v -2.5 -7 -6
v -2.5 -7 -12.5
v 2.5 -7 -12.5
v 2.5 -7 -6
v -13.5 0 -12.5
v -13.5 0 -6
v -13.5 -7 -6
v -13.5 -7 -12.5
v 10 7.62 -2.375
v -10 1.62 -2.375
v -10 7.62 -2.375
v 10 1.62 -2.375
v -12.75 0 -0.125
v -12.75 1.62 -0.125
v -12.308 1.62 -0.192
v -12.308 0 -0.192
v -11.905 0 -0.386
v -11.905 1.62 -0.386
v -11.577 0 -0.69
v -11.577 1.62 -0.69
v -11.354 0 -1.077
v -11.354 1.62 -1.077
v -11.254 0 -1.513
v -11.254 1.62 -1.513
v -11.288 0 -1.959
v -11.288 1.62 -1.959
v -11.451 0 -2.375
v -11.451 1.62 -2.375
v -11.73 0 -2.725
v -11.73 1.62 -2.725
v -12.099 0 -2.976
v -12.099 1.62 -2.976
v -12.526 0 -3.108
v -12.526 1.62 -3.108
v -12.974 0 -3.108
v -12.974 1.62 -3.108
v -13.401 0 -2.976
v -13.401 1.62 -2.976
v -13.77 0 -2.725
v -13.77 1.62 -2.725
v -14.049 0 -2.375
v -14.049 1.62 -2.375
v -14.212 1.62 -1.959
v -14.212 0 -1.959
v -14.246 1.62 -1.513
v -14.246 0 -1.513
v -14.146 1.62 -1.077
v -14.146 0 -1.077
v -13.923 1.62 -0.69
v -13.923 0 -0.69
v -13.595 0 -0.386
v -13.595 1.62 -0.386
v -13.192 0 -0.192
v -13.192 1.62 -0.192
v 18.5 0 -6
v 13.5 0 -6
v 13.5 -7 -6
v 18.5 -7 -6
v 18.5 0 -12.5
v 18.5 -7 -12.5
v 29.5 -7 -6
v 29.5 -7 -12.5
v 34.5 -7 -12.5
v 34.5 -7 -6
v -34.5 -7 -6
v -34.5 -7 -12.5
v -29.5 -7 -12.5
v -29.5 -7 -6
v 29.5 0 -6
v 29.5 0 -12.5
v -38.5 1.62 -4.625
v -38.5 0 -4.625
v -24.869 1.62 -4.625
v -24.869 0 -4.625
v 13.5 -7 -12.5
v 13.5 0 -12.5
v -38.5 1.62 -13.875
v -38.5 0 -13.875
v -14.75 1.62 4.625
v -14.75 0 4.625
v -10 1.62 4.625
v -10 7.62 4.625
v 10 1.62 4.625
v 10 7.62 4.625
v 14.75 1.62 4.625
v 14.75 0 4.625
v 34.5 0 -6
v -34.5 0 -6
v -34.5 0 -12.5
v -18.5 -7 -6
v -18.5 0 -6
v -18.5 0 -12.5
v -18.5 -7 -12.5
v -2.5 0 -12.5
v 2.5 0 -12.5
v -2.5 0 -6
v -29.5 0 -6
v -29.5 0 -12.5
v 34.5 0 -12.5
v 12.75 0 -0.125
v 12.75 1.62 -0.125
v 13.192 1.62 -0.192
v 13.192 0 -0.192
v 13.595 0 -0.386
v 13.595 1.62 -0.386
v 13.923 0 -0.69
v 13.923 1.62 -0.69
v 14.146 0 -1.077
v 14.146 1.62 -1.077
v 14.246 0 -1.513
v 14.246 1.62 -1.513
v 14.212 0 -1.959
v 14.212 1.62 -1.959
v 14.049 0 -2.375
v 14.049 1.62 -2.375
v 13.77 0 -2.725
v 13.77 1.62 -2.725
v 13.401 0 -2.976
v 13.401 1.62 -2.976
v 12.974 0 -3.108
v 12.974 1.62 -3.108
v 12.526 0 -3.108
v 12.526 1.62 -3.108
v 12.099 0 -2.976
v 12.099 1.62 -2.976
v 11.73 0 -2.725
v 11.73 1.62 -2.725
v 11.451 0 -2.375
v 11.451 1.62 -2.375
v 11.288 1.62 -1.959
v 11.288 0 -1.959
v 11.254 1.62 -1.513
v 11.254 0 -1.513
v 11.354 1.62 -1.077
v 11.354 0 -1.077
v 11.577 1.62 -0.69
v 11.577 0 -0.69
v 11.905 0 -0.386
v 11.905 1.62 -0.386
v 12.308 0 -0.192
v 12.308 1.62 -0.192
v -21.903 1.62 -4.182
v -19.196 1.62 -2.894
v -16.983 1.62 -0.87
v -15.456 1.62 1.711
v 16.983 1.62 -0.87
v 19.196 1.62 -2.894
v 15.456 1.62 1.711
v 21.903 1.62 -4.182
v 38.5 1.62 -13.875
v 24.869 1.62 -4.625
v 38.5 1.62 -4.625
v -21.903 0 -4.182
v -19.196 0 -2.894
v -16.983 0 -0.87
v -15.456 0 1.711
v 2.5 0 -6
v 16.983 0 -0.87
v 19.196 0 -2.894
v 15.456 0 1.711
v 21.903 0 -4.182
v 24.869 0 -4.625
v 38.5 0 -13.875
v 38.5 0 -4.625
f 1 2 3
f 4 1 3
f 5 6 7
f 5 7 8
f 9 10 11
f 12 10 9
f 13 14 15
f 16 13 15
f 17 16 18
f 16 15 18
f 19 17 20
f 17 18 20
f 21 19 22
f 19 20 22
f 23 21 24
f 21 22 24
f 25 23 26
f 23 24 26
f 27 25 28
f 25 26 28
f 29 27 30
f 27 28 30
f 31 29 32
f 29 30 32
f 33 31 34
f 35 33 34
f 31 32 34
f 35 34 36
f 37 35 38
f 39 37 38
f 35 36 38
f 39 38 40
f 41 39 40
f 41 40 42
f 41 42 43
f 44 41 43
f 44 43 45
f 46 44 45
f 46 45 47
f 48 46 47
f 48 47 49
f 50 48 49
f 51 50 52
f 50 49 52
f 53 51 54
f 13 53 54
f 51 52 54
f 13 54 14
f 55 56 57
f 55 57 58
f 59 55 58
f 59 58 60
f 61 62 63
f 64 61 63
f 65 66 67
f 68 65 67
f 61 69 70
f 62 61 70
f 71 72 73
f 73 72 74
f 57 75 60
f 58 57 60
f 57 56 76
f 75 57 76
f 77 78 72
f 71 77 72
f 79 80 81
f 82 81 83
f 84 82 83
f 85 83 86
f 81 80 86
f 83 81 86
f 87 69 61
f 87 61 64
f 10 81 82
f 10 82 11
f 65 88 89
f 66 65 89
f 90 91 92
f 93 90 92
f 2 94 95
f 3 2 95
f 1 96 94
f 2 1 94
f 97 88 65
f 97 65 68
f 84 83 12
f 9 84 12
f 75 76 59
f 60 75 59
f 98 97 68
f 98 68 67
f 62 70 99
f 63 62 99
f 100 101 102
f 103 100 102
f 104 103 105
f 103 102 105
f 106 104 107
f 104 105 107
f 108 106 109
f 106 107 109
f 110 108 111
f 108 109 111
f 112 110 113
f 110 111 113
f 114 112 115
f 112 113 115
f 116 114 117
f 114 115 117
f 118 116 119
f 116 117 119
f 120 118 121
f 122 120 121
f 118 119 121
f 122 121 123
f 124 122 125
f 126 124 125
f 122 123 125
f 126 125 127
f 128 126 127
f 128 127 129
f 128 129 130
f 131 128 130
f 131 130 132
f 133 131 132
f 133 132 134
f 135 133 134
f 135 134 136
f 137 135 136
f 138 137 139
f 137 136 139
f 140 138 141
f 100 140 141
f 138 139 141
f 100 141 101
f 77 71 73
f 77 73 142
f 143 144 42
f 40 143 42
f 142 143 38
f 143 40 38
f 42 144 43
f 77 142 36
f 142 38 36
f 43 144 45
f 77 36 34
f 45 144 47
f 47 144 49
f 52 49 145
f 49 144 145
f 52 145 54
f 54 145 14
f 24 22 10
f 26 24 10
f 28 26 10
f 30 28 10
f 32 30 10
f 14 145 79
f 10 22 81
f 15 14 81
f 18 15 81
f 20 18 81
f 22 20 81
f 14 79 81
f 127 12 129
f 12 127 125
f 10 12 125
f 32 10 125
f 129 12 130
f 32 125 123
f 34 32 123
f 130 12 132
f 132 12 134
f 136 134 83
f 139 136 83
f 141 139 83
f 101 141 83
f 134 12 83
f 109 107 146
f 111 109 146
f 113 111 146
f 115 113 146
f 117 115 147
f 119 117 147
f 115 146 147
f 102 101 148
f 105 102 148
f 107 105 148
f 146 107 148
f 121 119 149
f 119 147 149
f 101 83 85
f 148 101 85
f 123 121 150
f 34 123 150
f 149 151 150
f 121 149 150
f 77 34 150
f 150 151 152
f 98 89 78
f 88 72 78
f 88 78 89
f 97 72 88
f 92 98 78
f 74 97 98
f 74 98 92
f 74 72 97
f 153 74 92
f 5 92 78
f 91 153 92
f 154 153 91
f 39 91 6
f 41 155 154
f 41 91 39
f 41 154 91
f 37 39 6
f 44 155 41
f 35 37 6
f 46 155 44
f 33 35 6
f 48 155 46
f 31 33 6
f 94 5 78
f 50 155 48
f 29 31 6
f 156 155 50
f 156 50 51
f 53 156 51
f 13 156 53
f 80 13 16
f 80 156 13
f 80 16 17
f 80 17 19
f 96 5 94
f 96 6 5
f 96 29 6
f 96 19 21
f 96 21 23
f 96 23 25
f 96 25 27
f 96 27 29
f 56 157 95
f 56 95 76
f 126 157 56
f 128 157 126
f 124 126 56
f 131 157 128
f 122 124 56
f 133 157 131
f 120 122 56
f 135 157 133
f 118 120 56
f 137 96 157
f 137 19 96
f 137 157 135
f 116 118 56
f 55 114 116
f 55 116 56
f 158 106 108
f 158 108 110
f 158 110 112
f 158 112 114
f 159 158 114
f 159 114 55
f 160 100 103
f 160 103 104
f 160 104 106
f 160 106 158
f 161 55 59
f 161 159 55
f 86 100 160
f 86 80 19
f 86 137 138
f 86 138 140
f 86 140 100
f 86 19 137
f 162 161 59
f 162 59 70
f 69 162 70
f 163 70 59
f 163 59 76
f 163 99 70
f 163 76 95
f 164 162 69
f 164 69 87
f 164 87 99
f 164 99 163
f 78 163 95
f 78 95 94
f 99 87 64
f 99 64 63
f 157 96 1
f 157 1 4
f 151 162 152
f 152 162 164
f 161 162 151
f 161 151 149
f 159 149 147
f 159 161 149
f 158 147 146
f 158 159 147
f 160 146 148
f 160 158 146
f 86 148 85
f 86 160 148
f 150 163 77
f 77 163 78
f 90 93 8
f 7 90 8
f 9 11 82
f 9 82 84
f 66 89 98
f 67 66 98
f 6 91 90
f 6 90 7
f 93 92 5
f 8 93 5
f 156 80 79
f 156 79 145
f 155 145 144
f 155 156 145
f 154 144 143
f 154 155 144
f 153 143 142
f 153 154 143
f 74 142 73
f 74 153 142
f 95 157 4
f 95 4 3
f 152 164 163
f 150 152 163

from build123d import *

# Parameters (mm, degrees)
SKETCH1_W           = 5
SKETCH1_H           = 6.5
SKETCH1_W_2         = 29.5
SKETCH1_H_2         = 9.25
BOSS_EXTRUDE1_DEPTH = 1.62
FILLET1_R           = 10.16
SKETCH1_3_W         = 5
SKETCH1_3_H         = 6.5
BOSS_EXTRUDE2_DEPTH = 7
SKETCH2_R           = 1.5
CUT_EXTRUDE1_DEPTH  = 1.62
SKETCH3_W           = 20
SKETCH3_H           = 7
BOSS_EXTRUDE3_DEPTH = 6


with BuildPart() as part:
    # Sketch1 → Boss-Extrude1 (new body)
    # profile 1 of 7: a face of its own
    with BuildSketch(Plane(origin=(0, 0, 0), x_dir=(1, 0, 0), z_dir=(0, 1, 0))):
        Polygon((-38.5, 4.625), (-14.75, 4.625), (14.75, 4.625), (38.5, 4.625), (38.5, 13.875), (-38.5, 13.875), align=None)
        with Locations((-31.9999868, 9.25)):
            Rectangle(SKETCH1_W, SKETCH1_H, mode=Mode.SUBTRACT)
        with Locations((-15.9999934, 9.25)):
            Rectangle(SKETCH1_W, SKETCH1_H, mode=Mode.SUBTRACT)
        with Locations((0, 9.25)):
            Rectangle(SKETCH1_W, SKETCH1_H, mode=Mode.SUBTRACT)
        with Locations((15.9999934, 9.25)):
            Rectangle(SKETCH1_W, SKETCH1_H, mode=Mode.SUBTRACT)
        with Locations((31.9999868, 9.25)):
            Rectangle(SKETCH1_W, SKETCH1_H, mode=Mode.SUBTRACT)
    # profile 2 of 7: a face of its own
    with BuildSketch(Plane(origin=(0, 0, 0), x_dir=(1, 0, 0), z_dir=(0, 1, 0))):
        with Locations((-31.9999868, 9.25)):
            Rectangle(SKETCH1_W, SKETCH1_H)
    # profile 3 of 7: a face of its own
    with BuildSketch(Plane(origin=(0, 0, 0), x_dir=(1, 0, 0), z_dir=(0, 1, 0))):
        with Locations((-15.9999934, 9.25)):
            Rectangle(SKETCH1_W, SKETCH1_H)
    # profile 4 of 7: a face of its own
    with BuildSketch(Plane(origin=(0, 0, 0), x_dir=(1, 0, 0), z_dir=(0, 1, 0))):
        Rectangle(SKETCH1_W_2, SKETCH1_H_2)
    # profile 5 of 7: a face of its own
    with BuildSketch(Plane(origin=(0, 0, 0), x_dir=(1, 0, 0), z_dir=(0, 1, 0))):
        with Locations((0, 9.25)):
            Rectangle(SKETCH1_W, SKETCH1_H)
    # profile 6 of 7: a face of its own
    with BuildSketch(Plane(origin=(0, 0, 0), x_dir=(1, 0, 0), z_dir=(0, 1, 0))):
        with Locations((15.9999934, 9.25)):
            Rectangle(SKETCH1_W, SKETCH1_H)
    # profile 7 of 7: a face of its own
    with BuildSketch(Plane(origin=(0, 0, 0), x_dir=(1, 0, 0), z_dir=(0, 1, 0))):
        with Locations((31.9999868, 9.25)):
            Rectangle(SKETCH1_W, SKETCH1_H)
    extrude(amount=BOSS_EXTRUDE1_DEPTH)

    # Fillet1
    # the kernel refuses this fillet: 10.16 mm, written as the material it adds along each edge
    with BuildSketch(Plane(origin=(14.75, 0, -4.625), x_dir=(0, 0, 1), z_dir=(0, 1, 0))) as fillet1_piece_1:
        with BuildLine():
            CenterArc((10.16, 10.119164985), FILLET1_R, 180, 84.861306661)
            Line((0, 10.119164985), (-0.2032, 10.119164985))
            Line((-0.2032, 10.119164985), (-0.2032, 0))
            Line((-0.2032, 0), (0, -0.2032))
            ThreePointArc((0, -0.2032), (4.625, -0.2032), (9.2318, -0.2023833))
            Line((9.2318, -0.2023833), (9.25, 0))
        make_face()
    extrude(amount=1.62)
    with BuildSketch(Plane(origin=(-14.75, 0, -4.625), x_dir=(-1, 0, 0), z_dir=(0, 1, 0))) as fillet1_piece_2:
        with BuildLine():
            CenterArc((10.119164985, 10.16), FILLET1_R, 185.138693339, 84.861306661)
            Line((0, 9.25), (-0.2023833, 9.2318))
            ThreePointArc((-0.2023833, 9.2318), (-0.2032, 4.625), (-0.2032, 0))
            Line((-0.2032, 0), (0, -0.2032))
            Line((0, -0.2032), (10.119164985, -0.2032))
            Line((10.119164985, -0.2032), (10.119164985, 0))
        make_face()
    extrude(amount=1.62)

    # Sketch1<3> → Boss-Extrude2 (add)
    with BuildSketch(Plane(origin=(0, 0, 0), x_dir=(1, 0, 0), z_dir=(0, 1, 0))):
        with Locations((31.9999868, 9.25)):
            Rectangle(SKETCH1_3_W, SKETCH1_3_H)
        with Locations((15.9999934, 9.25)):
            Rectangle(SKETCH1_3_W, SKETCH1_3_H)
        with Locations((0, 9.25)):
            Rectangle(SKETCH1_3_W, SKETCH1_3_H)
        with Locations((-15.9999934, 9.25)):
            Rectangle(SKETCH1_3_W, SKETCH1_3_H)
        with Locations((-31.9999868, 9.25)):
            Rectangle(SKETCH1_3_W, SKETCH1_3_H)
    extrude(amount=-BOSS_EXTRUDE2_DEPTH)

    # Sketch2 → Cut-Extrude1 (cut)
    with BuildSketch(Plane(origin=(0, 1.62, 0), x_dir=(1, 0, 0), z_dir=(0, 1, 0))):
        with Locations(Location((-12.749999979, 1.624999898, 0), (0, 0, 270))):
            Circle(SKETCH2_R)
        with Locations(Location((12.749999979, 1.624999898, 0), (0, 0, 270))):
            Circle(SKETCH2_R)
    extrude(amount=-CUT_EXTRUDE1_DEPTH, mode=Mode.SUBTRACT)

    # Sketch3 → Boss-Extrude3 (add)
    with BuildSketch(Plane(origin=(0, 1.62, 0), x_dir=(1, 0, 0), z_dir=(0, 1, 0))):
        with Locations((0, -1.125)):
            Rectangle(SKETCH3_W, SKETCH3_H)
    extrude(amount=BOSS_EXTRUDE3_DEPTH)


solid = part.part
